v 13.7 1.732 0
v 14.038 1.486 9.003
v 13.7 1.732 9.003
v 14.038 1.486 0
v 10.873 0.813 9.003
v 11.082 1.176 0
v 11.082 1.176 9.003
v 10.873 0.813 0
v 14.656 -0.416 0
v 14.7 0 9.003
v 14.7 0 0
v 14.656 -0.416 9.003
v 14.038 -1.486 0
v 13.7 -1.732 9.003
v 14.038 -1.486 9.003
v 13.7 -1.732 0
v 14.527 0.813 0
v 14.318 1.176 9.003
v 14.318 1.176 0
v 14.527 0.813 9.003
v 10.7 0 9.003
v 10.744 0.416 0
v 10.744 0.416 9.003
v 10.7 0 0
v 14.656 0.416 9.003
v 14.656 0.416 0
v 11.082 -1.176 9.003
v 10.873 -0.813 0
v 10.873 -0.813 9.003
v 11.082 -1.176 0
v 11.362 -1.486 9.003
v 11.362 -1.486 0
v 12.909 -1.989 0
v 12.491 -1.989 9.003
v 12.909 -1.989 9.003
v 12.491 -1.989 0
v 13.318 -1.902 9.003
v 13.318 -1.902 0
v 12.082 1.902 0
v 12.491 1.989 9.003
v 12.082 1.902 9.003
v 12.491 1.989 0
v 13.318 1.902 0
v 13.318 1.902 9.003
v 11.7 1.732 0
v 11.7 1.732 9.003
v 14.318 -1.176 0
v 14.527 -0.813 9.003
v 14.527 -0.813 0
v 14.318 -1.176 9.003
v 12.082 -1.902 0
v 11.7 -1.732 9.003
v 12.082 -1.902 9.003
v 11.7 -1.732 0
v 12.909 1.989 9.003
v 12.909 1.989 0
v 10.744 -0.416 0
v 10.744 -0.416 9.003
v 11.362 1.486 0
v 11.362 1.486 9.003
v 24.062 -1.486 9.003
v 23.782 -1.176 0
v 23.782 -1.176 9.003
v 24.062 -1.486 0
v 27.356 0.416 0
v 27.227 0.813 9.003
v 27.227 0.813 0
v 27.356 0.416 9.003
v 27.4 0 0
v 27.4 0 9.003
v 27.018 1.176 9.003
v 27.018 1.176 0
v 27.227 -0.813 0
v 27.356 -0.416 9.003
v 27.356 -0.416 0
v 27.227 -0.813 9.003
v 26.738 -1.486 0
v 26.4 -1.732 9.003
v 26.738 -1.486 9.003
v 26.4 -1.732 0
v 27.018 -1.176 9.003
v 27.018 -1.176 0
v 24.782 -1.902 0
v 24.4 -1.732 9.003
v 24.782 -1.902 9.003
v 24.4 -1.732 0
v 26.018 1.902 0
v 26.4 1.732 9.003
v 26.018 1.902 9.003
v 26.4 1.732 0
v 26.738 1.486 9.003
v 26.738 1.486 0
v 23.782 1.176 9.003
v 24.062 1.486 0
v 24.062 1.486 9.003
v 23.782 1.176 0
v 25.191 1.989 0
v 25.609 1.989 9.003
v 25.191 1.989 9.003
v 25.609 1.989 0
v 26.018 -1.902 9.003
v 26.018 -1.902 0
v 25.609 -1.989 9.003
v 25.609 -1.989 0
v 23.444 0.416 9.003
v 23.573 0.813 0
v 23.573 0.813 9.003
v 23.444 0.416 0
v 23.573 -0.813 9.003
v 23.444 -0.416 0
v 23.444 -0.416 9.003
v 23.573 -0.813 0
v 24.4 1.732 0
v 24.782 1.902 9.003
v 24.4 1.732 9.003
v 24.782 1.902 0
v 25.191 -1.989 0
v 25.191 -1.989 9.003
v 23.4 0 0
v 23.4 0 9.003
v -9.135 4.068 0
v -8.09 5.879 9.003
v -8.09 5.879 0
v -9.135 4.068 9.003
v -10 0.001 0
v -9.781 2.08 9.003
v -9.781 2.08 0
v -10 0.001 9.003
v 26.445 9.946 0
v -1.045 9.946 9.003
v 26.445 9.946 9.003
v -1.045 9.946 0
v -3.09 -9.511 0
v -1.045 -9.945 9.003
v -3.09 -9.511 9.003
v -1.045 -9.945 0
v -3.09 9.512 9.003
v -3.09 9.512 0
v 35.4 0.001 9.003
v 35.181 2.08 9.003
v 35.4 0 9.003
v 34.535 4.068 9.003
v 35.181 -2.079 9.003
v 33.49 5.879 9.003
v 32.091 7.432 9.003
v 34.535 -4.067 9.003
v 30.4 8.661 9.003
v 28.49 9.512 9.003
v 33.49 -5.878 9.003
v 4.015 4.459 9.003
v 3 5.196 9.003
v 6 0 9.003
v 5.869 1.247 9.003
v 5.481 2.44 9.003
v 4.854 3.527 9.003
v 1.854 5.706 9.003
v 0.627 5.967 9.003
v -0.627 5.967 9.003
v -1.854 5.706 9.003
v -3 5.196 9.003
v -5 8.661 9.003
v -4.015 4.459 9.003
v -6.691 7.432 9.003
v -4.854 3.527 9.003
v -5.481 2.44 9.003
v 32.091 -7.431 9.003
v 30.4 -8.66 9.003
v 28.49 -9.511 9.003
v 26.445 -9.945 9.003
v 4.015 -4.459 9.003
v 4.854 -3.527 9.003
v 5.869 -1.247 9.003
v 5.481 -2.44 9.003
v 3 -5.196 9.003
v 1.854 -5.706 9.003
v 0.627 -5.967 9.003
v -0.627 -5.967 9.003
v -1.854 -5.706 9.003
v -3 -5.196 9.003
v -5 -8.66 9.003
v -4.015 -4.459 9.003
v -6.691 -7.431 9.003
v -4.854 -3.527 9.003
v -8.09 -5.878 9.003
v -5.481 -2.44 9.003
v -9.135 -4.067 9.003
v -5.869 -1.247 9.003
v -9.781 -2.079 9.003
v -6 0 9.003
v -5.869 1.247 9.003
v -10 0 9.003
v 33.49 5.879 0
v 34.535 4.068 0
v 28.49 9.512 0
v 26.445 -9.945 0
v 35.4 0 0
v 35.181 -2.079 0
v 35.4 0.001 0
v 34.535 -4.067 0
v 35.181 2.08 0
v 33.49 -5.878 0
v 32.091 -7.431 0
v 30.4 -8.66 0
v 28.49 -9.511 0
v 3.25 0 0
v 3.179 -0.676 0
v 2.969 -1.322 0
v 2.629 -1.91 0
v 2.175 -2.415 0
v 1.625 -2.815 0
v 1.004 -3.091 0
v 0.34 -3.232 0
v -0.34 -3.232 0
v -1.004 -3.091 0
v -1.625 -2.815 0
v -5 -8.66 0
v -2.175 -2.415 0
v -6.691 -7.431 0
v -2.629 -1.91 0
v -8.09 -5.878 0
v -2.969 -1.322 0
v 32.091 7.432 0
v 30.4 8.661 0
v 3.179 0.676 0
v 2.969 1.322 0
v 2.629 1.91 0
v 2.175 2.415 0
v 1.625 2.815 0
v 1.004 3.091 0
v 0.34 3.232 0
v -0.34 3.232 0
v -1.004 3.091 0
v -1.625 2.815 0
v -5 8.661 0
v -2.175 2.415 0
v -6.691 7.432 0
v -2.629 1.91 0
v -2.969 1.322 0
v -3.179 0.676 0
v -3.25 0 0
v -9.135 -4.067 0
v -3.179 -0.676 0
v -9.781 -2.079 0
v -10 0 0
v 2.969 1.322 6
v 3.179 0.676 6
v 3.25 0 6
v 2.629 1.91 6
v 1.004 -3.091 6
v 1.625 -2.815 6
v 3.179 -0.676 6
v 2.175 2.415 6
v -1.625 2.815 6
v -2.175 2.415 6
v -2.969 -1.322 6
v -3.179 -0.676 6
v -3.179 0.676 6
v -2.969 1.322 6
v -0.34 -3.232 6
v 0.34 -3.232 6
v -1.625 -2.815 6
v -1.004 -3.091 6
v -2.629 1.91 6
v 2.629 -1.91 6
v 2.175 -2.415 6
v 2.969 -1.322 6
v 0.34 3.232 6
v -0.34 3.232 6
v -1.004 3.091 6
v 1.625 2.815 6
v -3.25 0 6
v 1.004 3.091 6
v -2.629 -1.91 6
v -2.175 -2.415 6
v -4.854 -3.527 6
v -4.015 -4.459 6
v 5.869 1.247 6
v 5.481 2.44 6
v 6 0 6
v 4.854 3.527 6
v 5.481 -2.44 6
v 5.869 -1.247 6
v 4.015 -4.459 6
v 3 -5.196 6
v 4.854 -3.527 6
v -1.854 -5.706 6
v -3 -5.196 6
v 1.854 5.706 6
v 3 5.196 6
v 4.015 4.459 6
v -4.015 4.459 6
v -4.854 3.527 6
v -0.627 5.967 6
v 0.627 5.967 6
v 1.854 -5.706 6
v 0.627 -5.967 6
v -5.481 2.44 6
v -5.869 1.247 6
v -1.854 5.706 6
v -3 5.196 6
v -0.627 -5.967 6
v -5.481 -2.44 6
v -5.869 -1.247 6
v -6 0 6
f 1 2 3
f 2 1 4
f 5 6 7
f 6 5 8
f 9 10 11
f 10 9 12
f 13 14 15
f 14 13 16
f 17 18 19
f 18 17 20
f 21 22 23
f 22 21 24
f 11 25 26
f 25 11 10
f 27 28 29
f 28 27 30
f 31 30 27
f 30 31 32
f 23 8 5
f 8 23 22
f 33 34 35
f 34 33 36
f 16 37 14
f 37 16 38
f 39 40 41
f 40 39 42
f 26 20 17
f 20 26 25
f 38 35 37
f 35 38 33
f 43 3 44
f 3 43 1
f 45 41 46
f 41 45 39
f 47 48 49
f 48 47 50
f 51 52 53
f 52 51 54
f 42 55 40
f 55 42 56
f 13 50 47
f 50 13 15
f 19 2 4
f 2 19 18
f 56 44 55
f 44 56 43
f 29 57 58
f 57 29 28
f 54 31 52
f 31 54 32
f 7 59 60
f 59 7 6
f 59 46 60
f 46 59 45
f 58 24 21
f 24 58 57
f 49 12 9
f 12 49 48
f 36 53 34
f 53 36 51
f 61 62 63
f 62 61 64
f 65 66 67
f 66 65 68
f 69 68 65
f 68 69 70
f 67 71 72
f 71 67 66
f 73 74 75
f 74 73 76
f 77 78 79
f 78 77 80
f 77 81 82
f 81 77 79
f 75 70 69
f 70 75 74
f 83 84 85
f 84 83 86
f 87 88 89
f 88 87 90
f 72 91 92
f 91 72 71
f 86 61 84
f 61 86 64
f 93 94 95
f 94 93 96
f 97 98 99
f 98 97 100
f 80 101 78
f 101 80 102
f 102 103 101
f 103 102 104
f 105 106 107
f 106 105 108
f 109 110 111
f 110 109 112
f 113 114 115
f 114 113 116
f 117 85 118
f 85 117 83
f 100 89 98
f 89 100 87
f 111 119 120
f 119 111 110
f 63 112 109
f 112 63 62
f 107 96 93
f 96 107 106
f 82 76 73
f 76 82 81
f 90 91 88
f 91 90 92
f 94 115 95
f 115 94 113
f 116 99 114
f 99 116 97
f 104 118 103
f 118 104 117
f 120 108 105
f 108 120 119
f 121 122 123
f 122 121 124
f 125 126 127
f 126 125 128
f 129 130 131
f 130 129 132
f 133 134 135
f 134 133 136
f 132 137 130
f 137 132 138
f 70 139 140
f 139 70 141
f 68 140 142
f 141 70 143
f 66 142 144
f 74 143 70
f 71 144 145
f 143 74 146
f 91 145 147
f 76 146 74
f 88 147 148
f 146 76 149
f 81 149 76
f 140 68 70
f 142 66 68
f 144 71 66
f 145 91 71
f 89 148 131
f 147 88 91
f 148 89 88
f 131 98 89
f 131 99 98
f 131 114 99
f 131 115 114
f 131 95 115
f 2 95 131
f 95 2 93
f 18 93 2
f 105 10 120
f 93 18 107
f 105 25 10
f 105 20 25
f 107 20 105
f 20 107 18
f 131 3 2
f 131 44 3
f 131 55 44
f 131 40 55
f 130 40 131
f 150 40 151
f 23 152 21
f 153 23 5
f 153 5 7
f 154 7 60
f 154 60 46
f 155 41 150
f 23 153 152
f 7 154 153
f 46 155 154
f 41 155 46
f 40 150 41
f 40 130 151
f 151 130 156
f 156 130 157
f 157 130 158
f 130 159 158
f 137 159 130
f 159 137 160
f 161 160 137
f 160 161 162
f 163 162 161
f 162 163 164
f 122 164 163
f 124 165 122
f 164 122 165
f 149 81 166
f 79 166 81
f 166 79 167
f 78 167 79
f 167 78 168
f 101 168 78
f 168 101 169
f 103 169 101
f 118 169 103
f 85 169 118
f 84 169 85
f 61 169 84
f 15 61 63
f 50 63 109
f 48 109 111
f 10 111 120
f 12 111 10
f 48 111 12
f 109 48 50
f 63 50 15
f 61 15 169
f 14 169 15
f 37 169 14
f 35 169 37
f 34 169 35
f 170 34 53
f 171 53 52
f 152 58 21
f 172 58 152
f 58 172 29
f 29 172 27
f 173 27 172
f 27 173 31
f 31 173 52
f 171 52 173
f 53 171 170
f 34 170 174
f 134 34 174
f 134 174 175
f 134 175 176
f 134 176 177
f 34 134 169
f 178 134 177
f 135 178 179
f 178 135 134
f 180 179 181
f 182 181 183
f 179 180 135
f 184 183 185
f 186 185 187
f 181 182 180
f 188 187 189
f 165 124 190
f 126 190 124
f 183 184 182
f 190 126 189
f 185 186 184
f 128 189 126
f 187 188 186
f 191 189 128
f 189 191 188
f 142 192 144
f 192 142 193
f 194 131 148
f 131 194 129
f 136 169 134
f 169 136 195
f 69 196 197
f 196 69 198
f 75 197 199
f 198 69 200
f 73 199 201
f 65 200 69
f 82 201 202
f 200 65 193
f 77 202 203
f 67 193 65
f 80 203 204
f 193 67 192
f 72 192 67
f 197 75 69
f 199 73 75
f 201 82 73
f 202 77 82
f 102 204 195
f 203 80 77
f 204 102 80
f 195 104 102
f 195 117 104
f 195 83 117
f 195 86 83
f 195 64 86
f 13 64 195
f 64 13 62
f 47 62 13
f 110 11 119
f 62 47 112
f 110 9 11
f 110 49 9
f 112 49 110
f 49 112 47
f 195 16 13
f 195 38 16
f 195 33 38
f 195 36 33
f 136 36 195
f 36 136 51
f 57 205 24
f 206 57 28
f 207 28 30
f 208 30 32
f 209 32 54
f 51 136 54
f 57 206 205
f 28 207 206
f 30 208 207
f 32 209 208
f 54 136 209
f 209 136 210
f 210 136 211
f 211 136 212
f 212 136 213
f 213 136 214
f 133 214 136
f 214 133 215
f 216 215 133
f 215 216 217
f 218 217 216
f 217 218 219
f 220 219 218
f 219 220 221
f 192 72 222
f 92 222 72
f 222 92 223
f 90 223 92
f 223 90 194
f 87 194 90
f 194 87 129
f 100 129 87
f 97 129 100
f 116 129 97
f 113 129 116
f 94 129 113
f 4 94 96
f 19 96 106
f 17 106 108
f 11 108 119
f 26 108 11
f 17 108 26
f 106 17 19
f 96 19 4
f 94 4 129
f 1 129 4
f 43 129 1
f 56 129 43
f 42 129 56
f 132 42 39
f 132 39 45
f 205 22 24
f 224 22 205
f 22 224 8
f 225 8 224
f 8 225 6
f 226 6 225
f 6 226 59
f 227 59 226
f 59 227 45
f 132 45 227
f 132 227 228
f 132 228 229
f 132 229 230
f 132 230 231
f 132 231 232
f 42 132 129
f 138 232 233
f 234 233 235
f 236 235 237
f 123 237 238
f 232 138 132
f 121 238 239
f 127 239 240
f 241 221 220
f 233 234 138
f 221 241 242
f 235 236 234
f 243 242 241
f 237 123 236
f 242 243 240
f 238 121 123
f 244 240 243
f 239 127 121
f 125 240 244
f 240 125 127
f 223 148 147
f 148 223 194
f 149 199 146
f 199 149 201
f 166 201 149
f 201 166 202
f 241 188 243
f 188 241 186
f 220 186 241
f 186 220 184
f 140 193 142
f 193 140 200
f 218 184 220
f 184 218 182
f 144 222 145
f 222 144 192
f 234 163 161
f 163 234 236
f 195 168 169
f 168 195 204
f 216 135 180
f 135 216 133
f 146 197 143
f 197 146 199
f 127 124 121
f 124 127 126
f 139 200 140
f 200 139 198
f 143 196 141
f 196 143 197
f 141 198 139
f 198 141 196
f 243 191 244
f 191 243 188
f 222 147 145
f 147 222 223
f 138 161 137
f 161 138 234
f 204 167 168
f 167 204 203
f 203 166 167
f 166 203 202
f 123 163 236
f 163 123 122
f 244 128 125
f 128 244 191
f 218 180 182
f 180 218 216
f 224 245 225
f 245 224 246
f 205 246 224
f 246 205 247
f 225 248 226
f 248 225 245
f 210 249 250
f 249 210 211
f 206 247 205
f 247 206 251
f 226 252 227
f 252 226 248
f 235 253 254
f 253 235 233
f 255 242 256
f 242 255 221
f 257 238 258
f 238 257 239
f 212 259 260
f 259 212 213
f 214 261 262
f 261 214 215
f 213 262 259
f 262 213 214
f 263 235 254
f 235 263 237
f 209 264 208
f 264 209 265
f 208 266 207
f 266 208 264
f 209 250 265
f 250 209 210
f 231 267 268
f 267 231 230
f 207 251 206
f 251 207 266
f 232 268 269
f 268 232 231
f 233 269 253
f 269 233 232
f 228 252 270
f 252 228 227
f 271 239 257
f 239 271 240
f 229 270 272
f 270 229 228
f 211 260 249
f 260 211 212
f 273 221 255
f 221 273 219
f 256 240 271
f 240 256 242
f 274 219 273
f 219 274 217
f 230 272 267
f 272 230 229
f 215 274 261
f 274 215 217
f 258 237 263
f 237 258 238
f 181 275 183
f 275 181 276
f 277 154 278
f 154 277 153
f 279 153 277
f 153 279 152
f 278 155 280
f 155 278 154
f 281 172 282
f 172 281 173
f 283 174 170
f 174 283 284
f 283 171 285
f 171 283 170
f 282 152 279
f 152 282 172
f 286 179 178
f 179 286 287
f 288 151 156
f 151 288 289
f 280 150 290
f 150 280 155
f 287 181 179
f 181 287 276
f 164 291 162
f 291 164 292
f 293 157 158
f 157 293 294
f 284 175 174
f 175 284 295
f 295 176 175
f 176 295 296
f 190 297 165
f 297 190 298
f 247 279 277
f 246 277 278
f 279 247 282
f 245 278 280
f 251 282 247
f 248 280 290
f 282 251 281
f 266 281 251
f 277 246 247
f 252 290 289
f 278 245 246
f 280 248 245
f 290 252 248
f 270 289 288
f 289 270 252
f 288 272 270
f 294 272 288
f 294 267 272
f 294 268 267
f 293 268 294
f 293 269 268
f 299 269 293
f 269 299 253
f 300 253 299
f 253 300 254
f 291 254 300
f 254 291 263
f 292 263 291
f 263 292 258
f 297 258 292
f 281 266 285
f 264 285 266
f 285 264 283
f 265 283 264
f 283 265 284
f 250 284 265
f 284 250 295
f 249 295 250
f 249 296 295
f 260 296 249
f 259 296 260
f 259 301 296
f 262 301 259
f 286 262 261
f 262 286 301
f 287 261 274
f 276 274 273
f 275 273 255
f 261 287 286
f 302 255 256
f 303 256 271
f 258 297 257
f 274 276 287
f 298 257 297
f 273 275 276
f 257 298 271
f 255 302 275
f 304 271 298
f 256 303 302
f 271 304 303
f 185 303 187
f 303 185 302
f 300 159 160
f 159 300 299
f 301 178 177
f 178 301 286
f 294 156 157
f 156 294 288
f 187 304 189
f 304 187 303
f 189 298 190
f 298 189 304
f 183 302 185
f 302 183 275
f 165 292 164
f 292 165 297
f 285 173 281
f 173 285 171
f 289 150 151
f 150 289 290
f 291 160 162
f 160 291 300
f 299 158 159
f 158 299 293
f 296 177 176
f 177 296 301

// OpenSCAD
$fn=30;

difference(){
scale([1,1,3])meccano(n=3);
cylinder(d=6.5,h=10);
translate([0,0,6])cylinder(d=12,h=10);
}

//translate([-12.7,0,0])meccano(n=5);

module meccano(n=2){
difference(){
    minkowski(){
        cylinder(d=20,h=3);
        cube([(n-1)*12.7,.001,0.001]);
    }
    for (i=[0:n-1]){
        translate([i*12.7,0,-1])cylinder(d=4,h=5);
    }
}
}
